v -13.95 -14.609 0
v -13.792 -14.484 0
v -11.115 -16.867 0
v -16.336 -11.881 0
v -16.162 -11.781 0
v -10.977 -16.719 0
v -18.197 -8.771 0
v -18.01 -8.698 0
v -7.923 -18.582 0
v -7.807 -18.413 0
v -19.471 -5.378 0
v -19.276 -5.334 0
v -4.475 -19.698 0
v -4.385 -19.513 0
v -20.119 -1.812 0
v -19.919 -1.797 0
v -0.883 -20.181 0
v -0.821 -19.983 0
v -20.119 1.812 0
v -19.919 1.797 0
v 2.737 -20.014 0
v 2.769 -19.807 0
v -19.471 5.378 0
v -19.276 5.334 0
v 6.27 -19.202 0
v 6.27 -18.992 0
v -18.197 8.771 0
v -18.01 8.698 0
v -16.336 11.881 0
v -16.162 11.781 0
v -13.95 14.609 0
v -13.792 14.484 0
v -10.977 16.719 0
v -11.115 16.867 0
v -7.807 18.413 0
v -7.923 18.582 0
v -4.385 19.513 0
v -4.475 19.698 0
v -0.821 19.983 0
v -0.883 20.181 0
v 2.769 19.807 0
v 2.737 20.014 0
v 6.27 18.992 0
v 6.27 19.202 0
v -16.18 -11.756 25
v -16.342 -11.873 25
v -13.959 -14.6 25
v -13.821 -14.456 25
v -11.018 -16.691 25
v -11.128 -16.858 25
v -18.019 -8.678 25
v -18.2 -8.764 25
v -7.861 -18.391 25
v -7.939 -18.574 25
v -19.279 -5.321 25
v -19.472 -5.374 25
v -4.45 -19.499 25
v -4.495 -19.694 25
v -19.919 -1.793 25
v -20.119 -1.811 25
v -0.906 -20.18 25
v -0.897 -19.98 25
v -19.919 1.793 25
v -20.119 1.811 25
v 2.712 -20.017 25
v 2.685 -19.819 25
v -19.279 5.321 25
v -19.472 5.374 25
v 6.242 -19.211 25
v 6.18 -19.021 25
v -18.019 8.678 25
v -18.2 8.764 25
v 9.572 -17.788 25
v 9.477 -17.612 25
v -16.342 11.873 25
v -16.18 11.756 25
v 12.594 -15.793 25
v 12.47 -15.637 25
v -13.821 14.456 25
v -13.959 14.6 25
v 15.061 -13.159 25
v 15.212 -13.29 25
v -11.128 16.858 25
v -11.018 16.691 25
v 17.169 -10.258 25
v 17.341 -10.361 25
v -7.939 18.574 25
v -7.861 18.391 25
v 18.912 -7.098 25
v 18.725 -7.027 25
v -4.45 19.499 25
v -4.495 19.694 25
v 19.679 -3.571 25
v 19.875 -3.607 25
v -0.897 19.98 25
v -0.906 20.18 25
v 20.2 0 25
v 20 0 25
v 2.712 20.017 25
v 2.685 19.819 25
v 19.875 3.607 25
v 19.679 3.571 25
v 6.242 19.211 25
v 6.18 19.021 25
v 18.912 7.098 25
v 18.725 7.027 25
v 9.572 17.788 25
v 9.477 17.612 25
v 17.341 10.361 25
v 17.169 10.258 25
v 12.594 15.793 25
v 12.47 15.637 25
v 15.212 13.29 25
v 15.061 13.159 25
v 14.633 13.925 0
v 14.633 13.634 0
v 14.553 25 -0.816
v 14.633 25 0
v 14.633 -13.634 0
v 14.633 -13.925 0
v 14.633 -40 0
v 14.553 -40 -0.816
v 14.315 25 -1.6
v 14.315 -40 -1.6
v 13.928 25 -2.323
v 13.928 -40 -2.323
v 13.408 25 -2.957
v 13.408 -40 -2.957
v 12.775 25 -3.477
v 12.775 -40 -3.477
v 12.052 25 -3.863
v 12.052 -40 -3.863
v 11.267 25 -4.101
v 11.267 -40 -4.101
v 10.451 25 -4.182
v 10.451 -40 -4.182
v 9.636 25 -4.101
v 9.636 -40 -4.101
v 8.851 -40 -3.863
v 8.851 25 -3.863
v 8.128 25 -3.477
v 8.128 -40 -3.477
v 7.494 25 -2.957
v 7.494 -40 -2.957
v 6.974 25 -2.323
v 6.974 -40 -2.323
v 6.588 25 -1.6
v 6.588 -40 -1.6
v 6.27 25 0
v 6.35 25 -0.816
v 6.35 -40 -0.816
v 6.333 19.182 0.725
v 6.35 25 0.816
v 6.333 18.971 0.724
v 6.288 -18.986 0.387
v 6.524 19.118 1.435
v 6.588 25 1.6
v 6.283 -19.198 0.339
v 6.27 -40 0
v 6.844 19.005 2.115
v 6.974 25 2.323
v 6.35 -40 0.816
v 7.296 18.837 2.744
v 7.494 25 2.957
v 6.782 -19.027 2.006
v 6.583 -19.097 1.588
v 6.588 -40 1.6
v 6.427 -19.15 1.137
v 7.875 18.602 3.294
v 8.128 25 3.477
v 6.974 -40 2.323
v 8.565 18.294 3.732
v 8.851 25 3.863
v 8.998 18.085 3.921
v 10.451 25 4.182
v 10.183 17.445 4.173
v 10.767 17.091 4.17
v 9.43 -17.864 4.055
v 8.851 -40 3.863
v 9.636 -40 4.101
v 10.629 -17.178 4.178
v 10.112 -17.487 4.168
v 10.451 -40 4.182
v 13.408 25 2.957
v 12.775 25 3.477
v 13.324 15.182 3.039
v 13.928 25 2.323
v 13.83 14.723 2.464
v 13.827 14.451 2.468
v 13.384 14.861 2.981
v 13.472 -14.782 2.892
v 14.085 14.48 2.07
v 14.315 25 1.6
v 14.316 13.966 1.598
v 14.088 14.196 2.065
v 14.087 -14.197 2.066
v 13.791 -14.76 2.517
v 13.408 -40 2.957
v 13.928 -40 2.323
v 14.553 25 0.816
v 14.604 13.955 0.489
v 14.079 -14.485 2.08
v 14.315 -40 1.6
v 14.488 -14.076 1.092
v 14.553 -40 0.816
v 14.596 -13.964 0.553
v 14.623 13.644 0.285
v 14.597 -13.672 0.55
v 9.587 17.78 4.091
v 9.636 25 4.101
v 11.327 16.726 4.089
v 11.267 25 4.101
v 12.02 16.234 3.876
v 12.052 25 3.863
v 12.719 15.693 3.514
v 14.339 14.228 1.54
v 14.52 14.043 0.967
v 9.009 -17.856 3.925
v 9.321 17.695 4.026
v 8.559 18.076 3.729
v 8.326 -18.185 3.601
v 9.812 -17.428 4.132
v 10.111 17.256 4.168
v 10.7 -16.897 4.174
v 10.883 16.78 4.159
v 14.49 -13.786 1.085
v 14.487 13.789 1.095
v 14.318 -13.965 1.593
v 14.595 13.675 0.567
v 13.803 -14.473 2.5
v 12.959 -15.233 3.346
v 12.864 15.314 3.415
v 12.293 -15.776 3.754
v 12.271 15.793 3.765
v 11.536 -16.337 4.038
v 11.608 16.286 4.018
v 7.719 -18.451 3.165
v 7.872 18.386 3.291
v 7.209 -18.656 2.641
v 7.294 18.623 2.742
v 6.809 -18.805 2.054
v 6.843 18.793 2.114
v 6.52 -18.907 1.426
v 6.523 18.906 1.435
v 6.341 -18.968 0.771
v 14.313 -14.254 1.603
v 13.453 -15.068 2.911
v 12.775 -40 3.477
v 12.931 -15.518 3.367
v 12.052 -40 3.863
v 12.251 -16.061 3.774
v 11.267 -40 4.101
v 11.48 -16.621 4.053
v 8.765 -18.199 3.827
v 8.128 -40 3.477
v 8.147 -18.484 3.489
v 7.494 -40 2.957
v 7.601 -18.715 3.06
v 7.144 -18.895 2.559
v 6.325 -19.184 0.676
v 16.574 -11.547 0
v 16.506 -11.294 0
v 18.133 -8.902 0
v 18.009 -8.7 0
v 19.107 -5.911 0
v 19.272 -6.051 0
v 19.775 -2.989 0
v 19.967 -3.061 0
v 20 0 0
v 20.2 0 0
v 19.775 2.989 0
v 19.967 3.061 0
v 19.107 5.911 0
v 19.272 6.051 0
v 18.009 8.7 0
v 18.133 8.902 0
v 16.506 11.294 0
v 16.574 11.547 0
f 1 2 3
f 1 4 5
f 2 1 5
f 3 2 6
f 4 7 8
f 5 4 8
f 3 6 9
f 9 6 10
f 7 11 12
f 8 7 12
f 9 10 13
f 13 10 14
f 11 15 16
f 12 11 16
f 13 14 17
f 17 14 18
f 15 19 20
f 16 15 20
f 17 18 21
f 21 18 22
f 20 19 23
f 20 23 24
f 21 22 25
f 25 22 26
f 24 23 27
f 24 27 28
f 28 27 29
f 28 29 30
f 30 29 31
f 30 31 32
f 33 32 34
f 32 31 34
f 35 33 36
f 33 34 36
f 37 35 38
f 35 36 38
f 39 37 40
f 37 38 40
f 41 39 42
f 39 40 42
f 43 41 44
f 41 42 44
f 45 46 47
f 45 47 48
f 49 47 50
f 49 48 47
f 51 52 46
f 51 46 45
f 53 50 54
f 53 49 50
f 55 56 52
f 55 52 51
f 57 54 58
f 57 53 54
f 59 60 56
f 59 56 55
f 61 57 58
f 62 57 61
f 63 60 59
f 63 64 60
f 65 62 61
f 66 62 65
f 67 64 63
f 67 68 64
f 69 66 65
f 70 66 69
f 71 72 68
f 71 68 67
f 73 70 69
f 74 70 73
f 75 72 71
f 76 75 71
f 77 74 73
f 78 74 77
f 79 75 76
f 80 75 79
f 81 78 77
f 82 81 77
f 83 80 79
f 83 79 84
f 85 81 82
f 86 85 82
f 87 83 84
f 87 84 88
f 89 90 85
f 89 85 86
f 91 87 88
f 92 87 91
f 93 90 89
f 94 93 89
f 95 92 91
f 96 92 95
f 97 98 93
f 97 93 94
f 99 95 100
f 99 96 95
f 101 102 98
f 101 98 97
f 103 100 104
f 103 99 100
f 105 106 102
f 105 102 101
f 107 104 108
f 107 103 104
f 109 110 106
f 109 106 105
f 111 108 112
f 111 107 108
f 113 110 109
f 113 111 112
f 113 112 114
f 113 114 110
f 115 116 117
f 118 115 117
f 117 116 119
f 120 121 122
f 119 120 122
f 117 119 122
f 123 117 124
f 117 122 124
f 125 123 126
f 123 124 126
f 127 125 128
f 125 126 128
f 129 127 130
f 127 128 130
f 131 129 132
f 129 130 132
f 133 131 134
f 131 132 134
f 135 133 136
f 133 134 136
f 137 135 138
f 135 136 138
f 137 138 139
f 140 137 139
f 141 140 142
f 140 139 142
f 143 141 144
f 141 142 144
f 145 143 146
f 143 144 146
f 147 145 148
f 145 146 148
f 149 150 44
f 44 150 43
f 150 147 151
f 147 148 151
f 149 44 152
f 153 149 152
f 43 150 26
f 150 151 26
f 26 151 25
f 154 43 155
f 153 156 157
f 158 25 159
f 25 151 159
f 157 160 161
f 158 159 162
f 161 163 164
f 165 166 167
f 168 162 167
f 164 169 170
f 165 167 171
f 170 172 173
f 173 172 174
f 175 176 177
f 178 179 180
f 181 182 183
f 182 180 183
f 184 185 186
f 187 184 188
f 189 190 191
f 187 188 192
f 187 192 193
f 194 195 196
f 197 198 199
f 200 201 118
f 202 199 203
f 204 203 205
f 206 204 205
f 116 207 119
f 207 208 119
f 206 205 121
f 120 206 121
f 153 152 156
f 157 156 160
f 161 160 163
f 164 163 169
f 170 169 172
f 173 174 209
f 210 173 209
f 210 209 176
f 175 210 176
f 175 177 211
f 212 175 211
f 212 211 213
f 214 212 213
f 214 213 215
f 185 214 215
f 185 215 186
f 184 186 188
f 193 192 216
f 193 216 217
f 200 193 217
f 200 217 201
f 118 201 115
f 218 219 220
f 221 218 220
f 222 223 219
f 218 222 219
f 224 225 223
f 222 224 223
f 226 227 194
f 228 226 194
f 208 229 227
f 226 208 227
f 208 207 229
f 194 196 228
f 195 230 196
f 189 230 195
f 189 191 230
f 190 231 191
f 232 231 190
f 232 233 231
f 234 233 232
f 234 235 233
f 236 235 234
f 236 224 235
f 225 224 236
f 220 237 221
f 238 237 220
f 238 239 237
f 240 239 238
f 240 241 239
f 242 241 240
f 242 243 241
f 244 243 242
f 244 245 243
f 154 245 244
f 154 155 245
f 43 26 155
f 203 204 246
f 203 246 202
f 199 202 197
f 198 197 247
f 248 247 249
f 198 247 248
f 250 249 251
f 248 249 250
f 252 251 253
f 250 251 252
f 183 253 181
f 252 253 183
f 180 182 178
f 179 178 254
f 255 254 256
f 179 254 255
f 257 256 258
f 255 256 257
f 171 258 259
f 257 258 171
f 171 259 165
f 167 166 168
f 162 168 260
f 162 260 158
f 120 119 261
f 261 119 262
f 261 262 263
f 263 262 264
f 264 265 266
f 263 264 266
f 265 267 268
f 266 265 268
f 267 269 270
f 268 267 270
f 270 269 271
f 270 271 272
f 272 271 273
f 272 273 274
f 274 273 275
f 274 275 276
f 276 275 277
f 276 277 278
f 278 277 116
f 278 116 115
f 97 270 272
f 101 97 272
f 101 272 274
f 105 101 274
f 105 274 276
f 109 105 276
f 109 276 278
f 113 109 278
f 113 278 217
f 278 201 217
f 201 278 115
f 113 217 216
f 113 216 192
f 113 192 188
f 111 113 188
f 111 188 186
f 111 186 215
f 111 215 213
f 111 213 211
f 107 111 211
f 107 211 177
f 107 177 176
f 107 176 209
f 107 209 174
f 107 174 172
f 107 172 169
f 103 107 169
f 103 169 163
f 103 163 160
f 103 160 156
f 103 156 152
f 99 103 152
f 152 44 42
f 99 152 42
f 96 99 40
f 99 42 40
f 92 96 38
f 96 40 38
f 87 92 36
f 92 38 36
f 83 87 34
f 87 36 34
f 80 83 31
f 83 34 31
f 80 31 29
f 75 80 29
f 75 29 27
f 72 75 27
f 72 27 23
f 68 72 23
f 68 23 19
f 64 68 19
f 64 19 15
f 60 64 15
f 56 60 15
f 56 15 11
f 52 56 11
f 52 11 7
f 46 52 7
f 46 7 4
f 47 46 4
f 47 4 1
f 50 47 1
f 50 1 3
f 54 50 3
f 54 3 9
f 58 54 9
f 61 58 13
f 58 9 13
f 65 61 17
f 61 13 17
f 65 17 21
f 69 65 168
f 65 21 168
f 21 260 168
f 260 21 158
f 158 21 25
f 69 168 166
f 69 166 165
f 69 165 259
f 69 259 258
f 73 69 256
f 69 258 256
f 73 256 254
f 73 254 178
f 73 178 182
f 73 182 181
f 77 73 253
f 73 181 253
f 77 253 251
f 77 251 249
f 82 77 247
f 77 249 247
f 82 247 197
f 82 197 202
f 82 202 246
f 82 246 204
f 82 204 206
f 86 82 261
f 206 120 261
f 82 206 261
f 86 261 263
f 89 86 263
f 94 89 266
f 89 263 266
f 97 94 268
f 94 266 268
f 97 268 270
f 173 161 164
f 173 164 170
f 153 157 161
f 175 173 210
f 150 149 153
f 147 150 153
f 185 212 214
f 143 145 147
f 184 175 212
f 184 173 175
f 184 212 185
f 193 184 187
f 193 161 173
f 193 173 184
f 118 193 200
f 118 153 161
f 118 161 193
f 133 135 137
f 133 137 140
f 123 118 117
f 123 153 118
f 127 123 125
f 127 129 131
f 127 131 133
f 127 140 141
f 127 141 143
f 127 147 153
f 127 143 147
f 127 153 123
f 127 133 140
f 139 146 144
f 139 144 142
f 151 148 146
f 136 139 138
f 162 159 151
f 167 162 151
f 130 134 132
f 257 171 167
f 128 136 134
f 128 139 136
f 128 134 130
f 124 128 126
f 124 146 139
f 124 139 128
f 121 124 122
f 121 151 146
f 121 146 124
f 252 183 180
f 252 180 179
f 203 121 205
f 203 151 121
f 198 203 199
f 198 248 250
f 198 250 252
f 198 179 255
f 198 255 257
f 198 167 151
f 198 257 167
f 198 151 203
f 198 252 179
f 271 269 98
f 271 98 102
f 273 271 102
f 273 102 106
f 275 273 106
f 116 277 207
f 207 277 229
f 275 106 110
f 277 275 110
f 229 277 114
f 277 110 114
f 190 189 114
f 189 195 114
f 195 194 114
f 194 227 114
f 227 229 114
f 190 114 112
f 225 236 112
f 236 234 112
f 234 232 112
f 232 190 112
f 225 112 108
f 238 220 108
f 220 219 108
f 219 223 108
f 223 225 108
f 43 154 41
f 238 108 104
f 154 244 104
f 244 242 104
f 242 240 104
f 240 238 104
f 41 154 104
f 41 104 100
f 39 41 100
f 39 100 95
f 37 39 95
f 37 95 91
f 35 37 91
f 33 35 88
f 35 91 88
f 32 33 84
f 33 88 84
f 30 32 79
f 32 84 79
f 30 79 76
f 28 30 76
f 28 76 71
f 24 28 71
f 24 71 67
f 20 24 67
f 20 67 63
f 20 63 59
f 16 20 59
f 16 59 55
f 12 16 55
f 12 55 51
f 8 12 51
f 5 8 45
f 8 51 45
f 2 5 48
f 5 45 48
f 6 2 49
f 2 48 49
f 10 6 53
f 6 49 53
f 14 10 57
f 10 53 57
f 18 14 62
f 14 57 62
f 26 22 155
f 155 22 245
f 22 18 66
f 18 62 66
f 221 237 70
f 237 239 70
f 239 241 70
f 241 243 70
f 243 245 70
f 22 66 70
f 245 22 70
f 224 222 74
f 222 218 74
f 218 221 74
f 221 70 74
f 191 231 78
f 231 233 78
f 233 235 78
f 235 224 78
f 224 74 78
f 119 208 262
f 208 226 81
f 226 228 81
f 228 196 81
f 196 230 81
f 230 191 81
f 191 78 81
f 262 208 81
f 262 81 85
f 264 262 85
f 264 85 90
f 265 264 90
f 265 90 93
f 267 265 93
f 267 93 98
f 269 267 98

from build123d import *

# Parameters (mm, degrees)
F0_R      = 20.2
F2_DEPTH  = 25
F1_R      = 20
F3_DEPTH  = 12.5
F3_FACE_R = 20
F4_DEPTH  = 25
F5_R      = 4.181686
F6_DEPTH  = 40
F6_FACE_R = 4.181686
F7_DEPTH  = 25


with BuildPart() as f2:
    # F0 (on Top) → F2 (new body)
    with BuildSketch(Plane.XY):
        Circle(F0_R)
    extrude(amount=F2_DEPTH)

    # F1 (on Top) → F3 (cut, symmetric)
    with BuildSketch(Plane.XY):
        Circle(F1_R)
    extrude(amount=F3_DEPTH, both=True, mode=Mode.SUBTRACT)

    # F3_face (on face) → F4 (cut)
    with BuildSketch(Plane(origin=(0, 0, 12.5), x_dir=(1, 0, 0), z_dir=(0, 0, -1))):
        Circle(F3_FACE_R)
    extrude(amount=-F4_DEPTH, mode=Mode.SUBTRACT)

    # F5 (on Front) → F6 (join)
    with BuildSketch(Plane.XZ):
        with Locations((10.451388, 0)):
            Circle(F5_R)
    extrude(amount=F6_DEPTH)

    # F6_face (on face) → F7 (join)
    with BuildSketch(Plane(origin=(10.451388, 0, 0), x_dir=(1, 0, 0), z_dir=(0, 1, 0))):
        Circle(F6_FACE_R)
    extrude(amount=F7_DEPTH)


solid = f2.part
